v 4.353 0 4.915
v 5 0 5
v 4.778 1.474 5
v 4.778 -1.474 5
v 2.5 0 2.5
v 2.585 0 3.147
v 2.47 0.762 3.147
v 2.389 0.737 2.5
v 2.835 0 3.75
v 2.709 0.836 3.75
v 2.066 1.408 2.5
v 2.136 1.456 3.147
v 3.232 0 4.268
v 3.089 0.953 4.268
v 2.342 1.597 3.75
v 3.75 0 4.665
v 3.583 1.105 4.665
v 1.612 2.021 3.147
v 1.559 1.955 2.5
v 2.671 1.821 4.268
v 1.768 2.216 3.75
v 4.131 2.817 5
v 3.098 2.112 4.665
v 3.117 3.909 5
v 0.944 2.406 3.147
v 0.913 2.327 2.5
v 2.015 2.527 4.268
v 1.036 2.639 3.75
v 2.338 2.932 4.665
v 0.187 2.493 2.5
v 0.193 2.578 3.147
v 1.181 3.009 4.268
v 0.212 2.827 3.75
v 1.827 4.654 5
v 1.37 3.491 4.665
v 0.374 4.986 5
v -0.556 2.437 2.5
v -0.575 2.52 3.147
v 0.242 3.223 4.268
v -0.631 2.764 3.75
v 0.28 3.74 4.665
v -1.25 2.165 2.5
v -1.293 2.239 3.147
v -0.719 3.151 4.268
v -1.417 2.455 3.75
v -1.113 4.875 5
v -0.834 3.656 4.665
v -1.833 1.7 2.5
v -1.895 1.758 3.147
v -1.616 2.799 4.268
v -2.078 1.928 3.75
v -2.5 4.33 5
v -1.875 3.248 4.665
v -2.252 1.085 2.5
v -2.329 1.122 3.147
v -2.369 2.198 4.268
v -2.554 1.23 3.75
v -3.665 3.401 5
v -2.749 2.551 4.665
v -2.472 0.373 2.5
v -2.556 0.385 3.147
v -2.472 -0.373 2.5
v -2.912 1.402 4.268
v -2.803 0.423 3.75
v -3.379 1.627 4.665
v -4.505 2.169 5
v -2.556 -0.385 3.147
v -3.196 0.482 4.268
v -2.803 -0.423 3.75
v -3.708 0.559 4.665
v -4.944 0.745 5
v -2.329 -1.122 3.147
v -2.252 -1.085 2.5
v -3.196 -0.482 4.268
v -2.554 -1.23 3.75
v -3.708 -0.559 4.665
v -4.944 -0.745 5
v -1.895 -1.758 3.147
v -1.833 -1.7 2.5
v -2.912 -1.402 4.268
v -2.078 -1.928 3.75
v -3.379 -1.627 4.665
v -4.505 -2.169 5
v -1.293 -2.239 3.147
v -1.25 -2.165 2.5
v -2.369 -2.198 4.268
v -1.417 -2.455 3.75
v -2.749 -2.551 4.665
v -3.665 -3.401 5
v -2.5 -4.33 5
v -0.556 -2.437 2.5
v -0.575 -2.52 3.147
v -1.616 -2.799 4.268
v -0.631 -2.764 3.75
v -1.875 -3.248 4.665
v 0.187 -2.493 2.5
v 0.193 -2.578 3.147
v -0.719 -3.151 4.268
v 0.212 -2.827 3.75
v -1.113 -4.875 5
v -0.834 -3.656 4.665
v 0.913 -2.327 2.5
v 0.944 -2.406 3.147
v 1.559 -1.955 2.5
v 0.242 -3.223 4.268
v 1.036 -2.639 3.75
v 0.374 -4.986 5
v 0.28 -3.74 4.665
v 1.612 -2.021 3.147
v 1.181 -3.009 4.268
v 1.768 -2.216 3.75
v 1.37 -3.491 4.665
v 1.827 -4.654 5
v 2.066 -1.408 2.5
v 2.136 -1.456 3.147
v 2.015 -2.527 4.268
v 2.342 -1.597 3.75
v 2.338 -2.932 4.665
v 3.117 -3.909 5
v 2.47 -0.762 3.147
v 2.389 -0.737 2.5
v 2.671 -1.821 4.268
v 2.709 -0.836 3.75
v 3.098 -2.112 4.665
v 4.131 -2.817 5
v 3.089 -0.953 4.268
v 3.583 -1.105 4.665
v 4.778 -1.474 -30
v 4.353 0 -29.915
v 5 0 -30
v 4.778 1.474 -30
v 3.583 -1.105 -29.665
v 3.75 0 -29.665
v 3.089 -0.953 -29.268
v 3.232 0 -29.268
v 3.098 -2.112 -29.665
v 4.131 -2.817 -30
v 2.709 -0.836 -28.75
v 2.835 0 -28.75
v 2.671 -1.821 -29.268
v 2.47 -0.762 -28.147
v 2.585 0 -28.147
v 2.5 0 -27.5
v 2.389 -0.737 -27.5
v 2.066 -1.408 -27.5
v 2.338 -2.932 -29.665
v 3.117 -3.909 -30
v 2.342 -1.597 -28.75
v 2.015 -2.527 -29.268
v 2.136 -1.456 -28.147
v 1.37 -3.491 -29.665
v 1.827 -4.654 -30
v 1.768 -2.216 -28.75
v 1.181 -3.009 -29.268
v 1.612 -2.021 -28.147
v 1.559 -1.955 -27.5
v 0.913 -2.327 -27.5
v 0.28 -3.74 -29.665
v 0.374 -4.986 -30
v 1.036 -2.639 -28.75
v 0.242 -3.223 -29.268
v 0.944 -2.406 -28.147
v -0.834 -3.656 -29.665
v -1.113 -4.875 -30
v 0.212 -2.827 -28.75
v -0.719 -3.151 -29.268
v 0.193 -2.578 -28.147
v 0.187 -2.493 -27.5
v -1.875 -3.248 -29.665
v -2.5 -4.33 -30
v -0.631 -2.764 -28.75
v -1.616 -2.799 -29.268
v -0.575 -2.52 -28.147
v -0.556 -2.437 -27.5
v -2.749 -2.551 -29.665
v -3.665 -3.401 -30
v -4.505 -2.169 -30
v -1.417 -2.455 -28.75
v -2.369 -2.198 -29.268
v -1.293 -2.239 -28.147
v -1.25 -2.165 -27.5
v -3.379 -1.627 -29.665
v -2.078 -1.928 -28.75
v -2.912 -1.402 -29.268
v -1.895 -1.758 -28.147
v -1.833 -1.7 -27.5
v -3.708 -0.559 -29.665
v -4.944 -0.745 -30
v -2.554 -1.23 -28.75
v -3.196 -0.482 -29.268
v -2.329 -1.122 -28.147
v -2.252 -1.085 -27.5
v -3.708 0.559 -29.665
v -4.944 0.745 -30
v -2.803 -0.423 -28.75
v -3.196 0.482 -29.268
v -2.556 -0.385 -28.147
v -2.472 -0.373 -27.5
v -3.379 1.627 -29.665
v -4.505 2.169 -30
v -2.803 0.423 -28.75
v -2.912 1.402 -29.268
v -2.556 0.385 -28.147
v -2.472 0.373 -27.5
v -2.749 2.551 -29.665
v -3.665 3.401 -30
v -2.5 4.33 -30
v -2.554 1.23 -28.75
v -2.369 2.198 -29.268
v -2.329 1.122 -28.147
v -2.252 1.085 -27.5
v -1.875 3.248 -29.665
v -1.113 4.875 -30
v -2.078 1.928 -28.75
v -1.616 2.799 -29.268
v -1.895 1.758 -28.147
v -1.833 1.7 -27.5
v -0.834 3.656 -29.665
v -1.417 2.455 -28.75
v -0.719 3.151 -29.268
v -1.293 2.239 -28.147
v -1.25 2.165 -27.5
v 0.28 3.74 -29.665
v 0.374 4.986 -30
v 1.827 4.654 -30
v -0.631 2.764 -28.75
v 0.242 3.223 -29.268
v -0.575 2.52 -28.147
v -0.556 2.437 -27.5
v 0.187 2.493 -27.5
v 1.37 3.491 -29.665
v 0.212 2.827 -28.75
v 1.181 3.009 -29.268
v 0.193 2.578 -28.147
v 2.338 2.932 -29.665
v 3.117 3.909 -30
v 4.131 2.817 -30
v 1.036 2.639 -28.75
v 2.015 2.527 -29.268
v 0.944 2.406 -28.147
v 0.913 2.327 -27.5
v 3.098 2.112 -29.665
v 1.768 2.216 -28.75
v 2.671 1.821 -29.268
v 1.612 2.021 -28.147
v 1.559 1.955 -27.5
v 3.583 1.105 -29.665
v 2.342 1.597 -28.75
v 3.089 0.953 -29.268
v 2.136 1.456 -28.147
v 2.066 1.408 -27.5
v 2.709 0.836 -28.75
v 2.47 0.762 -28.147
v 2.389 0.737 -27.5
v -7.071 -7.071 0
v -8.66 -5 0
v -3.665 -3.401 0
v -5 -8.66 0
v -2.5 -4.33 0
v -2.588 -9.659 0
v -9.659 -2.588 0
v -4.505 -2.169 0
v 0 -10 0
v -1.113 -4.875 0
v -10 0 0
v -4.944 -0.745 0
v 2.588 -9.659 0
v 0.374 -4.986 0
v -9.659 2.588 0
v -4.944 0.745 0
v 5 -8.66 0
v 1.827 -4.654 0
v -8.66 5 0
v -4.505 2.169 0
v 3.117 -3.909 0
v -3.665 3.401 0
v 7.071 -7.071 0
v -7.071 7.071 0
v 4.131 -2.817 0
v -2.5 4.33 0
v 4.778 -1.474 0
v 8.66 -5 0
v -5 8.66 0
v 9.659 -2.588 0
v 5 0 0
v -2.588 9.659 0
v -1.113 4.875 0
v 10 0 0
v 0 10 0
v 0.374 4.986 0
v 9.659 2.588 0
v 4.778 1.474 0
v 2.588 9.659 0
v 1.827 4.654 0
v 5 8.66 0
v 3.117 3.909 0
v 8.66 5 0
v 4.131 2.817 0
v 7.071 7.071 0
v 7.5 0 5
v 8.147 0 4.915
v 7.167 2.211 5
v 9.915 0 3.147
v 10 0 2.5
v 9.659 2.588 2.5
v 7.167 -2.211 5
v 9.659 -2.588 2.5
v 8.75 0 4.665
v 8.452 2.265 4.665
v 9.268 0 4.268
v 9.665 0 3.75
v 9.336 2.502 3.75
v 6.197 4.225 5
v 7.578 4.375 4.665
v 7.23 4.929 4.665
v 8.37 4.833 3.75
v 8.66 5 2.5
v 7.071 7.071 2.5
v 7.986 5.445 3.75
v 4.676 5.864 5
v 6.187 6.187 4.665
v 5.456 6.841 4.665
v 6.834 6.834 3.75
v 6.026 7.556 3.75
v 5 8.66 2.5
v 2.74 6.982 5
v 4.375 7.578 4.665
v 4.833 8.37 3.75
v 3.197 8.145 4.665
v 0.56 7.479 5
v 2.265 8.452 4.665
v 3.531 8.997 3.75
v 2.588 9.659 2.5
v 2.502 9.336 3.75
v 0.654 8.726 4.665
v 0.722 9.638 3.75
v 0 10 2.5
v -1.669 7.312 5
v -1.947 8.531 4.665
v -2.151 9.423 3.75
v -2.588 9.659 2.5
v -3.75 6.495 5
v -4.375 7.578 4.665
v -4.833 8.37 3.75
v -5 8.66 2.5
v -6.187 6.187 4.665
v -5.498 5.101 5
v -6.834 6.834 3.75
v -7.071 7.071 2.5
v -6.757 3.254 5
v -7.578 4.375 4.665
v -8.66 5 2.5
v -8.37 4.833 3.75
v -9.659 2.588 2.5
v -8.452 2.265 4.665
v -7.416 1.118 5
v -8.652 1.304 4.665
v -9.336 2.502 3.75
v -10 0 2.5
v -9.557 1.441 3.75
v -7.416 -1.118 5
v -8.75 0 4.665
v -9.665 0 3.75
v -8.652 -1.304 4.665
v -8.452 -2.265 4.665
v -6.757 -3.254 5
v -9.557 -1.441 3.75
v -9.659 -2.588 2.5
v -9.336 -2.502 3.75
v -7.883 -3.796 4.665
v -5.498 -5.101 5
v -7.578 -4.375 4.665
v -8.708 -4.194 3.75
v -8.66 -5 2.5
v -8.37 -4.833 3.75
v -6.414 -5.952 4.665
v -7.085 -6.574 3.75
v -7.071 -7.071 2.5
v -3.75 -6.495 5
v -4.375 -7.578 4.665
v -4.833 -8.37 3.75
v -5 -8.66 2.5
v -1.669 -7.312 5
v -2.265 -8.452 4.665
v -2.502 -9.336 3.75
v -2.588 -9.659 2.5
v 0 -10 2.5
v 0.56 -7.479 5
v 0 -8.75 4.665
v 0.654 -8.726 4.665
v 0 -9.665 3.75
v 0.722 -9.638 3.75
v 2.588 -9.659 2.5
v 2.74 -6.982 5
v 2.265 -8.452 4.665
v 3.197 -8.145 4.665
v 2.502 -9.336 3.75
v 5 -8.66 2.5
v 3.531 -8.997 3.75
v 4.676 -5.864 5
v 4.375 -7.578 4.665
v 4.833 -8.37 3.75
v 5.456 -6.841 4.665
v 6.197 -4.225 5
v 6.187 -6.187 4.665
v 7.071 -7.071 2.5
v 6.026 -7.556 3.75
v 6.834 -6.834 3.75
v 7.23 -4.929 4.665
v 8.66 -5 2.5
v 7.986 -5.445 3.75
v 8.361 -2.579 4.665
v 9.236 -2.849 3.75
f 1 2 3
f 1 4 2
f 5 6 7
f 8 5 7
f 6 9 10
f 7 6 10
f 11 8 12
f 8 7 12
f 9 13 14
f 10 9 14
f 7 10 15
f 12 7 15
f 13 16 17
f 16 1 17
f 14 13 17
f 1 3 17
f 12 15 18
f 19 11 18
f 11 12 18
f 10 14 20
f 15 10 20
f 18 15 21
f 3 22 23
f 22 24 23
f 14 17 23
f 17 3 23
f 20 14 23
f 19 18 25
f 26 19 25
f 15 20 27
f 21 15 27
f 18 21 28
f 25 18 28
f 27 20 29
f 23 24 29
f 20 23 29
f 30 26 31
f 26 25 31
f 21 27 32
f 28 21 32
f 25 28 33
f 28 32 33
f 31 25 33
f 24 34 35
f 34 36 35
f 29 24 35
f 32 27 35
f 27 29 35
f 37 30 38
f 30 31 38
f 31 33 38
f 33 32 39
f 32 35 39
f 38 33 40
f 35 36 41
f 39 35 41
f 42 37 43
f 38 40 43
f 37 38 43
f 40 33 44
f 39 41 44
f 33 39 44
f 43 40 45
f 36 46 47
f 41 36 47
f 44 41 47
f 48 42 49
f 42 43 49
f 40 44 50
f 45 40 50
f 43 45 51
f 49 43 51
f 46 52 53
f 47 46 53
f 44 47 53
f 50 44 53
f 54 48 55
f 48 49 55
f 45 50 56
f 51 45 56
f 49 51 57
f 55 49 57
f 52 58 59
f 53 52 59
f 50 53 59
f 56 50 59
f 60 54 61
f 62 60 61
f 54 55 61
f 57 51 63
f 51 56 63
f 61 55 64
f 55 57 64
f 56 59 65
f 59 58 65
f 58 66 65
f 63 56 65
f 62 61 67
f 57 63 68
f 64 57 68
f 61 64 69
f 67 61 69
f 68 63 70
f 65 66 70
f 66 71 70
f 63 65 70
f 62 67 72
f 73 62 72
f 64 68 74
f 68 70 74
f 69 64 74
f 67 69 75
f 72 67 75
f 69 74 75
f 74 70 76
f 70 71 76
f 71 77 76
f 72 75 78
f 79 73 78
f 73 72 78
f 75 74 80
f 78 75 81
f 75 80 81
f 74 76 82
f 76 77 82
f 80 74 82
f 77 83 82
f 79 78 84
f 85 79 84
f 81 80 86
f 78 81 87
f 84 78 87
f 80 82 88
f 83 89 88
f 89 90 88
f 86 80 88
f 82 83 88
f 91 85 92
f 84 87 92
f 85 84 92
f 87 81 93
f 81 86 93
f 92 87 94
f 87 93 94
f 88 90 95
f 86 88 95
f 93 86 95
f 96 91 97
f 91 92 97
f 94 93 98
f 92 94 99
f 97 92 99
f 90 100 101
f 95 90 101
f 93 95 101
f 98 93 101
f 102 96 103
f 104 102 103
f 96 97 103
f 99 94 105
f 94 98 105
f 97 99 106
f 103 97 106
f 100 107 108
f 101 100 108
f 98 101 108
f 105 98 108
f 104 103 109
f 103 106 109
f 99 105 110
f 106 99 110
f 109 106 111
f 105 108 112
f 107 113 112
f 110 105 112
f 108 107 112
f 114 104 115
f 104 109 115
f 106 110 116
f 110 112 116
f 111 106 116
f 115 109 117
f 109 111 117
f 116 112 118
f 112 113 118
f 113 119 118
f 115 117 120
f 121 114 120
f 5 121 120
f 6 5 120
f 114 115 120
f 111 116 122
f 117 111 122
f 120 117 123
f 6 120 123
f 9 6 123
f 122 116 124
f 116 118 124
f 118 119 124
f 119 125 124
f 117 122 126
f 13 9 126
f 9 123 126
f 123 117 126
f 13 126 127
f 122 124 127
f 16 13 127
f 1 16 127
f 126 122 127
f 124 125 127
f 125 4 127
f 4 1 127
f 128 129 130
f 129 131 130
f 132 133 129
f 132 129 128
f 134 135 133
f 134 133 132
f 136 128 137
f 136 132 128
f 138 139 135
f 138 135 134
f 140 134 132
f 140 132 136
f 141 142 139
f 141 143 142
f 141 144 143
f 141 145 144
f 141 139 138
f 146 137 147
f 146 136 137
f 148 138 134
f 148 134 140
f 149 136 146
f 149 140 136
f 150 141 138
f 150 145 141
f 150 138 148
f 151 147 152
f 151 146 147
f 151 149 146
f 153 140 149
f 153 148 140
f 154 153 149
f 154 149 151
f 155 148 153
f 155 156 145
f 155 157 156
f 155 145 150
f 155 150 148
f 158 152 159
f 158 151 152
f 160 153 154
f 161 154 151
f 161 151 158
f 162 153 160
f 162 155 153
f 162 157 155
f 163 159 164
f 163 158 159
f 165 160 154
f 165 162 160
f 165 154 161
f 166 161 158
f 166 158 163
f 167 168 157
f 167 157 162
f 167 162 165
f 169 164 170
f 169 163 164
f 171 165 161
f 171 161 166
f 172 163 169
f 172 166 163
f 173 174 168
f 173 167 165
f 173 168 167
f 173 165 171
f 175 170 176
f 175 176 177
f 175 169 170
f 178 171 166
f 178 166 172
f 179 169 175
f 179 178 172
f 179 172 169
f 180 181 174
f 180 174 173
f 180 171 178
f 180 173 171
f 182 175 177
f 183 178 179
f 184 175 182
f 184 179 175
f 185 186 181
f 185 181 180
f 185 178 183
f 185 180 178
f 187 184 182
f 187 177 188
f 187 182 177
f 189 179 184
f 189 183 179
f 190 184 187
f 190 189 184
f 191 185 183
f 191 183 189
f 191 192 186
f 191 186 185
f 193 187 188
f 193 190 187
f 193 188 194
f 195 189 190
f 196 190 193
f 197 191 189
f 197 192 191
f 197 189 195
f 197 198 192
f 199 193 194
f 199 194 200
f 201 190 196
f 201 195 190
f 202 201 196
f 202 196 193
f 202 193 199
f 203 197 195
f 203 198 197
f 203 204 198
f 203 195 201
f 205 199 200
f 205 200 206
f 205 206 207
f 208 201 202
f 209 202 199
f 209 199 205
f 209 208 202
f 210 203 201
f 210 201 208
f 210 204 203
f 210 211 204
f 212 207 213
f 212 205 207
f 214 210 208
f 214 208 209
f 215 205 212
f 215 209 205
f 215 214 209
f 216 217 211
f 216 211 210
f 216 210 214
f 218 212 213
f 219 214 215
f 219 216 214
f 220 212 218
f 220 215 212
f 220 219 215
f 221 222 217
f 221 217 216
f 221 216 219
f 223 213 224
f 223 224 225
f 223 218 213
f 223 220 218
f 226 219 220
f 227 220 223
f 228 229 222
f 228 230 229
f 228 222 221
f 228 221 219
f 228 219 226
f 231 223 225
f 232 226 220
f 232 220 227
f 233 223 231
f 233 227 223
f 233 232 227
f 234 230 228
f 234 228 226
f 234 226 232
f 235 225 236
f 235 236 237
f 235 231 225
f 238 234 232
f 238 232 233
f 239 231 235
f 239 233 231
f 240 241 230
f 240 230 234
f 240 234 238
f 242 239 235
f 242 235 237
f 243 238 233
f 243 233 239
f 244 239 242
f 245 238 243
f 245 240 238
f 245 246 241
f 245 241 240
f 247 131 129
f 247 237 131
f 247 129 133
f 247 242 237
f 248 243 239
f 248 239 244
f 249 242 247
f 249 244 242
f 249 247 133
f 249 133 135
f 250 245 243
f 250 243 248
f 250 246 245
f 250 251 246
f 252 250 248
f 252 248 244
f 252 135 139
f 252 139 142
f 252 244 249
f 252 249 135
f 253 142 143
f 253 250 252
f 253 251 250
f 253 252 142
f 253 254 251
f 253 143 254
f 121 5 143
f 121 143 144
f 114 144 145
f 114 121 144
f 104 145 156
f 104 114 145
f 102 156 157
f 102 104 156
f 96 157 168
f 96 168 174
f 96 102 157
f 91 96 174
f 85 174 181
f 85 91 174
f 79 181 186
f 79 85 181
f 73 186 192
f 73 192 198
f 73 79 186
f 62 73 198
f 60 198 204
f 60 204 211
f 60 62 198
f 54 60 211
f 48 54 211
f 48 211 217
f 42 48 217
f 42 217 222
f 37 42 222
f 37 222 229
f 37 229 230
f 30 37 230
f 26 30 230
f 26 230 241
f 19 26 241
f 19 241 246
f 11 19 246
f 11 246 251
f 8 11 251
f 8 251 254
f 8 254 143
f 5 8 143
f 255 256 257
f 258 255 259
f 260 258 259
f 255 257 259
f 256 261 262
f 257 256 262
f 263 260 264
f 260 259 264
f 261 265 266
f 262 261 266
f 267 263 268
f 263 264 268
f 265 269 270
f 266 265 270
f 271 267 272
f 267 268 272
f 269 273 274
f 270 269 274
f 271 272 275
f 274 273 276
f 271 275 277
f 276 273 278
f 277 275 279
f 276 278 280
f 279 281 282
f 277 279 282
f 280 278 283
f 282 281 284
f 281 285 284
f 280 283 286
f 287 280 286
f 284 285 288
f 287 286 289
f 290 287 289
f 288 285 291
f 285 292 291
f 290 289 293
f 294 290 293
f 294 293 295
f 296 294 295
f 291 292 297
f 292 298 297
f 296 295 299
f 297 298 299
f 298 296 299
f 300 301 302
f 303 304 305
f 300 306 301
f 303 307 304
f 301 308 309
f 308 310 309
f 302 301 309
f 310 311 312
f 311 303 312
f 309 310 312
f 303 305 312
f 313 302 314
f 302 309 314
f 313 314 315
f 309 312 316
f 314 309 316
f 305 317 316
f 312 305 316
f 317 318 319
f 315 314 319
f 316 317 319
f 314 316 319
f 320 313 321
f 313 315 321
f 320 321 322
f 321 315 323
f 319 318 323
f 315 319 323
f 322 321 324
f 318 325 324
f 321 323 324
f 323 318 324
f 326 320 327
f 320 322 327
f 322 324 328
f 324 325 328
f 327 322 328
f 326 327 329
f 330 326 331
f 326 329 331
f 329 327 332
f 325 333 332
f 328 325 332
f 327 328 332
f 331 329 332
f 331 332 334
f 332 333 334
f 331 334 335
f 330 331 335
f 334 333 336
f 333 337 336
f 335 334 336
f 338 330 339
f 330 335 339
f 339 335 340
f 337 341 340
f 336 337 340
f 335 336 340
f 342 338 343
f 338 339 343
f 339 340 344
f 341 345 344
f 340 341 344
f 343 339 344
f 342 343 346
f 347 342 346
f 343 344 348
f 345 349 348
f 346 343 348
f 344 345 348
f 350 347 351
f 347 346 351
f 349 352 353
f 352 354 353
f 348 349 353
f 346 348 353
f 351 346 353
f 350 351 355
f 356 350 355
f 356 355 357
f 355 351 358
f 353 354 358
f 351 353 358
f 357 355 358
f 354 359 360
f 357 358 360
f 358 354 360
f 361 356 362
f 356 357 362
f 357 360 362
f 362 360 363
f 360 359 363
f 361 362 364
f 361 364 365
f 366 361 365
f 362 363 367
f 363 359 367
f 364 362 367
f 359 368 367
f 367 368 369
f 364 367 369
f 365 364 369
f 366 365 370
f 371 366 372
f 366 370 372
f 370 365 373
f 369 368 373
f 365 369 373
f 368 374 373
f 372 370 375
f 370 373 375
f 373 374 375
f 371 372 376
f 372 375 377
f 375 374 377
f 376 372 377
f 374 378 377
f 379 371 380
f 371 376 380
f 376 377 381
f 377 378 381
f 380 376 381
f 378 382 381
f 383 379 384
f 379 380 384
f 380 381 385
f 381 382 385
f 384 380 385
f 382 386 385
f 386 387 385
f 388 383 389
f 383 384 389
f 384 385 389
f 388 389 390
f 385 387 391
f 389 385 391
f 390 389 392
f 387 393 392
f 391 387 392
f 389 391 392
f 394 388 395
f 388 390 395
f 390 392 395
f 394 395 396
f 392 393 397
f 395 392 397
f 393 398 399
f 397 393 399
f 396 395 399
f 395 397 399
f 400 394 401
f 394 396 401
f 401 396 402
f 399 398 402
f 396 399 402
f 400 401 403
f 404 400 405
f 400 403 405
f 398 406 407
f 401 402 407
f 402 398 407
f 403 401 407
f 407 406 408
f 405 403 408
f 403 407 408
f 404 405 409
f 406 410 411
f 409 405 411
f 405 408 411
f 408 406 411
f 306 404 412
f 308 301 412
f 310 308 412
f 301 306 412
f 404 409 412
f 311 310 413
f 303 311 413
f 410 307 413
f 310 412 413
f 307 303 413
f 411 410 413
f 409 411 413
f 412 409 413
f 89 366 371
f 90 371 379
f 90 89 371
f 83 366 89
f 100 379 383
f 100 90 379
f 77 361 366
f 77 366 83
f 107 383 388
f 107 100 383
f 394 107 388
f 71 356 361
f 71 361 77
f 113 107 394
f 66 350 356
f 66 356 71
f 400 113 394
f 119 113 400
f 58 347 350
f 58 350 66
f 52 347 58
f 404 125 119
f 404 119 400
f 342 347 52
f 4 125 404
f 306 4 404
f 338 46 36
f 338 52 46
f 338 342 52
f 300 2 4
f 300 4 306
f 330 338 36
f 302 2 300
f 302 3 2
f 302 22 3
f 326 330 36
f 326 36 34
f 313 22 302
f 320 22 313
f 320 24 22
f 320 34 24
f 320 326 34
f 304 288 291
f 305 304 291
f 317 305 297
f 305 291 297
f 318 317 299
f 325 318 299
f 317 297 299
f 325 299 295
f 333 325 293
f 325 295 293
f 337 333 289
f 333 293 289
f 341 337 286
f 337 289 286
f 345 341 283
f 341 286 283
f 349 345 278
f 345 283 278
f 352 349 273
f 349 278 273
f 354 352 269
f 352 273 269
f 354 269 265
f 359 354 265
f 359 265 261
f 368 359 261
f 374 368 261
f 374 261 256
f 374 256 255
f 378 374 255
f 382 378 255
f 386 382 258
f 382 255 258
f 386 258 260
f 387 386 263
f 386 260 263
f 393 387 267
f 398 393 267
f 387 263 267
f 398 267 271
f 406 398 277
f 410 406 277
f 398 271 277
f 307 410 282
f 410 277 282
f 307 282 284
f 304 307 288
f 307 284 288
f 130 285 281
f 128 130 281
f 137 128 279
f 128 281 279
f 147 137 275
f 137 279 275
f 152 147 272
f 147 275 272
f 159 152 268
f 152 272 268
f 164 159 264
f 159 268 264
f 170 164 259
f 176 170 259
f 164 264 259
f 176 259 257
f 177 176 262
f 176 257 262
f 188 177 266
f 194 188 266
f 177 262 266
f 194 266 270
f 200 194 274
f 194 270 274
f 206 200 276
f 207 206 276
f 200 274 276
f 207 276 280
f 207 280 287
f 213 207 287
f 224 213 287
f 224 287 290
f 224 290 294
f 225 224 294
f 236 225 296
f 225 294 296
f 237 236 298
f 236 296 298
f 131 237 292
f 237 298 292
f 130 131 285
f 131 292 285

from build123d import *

# Parameters (mm, degrees)
F0_R     = 10
F0_R_2   = 2.5
F1_DEPTH = 5
F2_R     = 5
F2_R_2   = 2.5
F3_DEPTH = 30
F4_R     = 2.49999


# Not quite as in the source:
# - a fillet or chamfer is up to 0.001 mm smaller than in the source, because OpenCascade refuses the exact size


with BuildPart() as f1:
    # F0 (on Top) → F1 (new body)
    with BuildSketch(Plane.XY):
        Circle(F0_R)
        Circle(F0_R_2, mode=Mode.SUBTRACT)
    extrude(amount=F1_DEPTH)

    # F2 (on face) → F3 (join)
    with BuildSketch(Plane(origin=(0, 0, 0), x_dir=(1, 0, 0), z_dir=(0, 0, -1))):
        Circle(F2_R)
        Circle(F2_R_2, mode=Mode.SUBTRACT)
    extrude(amount=F3_DEPTH)

    # F4 (radius 2.5 in the source; OpenCascade refuses exactly that, so slightly less here)
    f4_edges = [f1.edges().sort_by_distance(p)[0] for p in [
        (-10, 0, 5),
        (-2.5, 0, 5),
        (-2.5, 0, -30),
    ]]
    fillet(f4_edges, radius=F4_R)


solid = f1.part
